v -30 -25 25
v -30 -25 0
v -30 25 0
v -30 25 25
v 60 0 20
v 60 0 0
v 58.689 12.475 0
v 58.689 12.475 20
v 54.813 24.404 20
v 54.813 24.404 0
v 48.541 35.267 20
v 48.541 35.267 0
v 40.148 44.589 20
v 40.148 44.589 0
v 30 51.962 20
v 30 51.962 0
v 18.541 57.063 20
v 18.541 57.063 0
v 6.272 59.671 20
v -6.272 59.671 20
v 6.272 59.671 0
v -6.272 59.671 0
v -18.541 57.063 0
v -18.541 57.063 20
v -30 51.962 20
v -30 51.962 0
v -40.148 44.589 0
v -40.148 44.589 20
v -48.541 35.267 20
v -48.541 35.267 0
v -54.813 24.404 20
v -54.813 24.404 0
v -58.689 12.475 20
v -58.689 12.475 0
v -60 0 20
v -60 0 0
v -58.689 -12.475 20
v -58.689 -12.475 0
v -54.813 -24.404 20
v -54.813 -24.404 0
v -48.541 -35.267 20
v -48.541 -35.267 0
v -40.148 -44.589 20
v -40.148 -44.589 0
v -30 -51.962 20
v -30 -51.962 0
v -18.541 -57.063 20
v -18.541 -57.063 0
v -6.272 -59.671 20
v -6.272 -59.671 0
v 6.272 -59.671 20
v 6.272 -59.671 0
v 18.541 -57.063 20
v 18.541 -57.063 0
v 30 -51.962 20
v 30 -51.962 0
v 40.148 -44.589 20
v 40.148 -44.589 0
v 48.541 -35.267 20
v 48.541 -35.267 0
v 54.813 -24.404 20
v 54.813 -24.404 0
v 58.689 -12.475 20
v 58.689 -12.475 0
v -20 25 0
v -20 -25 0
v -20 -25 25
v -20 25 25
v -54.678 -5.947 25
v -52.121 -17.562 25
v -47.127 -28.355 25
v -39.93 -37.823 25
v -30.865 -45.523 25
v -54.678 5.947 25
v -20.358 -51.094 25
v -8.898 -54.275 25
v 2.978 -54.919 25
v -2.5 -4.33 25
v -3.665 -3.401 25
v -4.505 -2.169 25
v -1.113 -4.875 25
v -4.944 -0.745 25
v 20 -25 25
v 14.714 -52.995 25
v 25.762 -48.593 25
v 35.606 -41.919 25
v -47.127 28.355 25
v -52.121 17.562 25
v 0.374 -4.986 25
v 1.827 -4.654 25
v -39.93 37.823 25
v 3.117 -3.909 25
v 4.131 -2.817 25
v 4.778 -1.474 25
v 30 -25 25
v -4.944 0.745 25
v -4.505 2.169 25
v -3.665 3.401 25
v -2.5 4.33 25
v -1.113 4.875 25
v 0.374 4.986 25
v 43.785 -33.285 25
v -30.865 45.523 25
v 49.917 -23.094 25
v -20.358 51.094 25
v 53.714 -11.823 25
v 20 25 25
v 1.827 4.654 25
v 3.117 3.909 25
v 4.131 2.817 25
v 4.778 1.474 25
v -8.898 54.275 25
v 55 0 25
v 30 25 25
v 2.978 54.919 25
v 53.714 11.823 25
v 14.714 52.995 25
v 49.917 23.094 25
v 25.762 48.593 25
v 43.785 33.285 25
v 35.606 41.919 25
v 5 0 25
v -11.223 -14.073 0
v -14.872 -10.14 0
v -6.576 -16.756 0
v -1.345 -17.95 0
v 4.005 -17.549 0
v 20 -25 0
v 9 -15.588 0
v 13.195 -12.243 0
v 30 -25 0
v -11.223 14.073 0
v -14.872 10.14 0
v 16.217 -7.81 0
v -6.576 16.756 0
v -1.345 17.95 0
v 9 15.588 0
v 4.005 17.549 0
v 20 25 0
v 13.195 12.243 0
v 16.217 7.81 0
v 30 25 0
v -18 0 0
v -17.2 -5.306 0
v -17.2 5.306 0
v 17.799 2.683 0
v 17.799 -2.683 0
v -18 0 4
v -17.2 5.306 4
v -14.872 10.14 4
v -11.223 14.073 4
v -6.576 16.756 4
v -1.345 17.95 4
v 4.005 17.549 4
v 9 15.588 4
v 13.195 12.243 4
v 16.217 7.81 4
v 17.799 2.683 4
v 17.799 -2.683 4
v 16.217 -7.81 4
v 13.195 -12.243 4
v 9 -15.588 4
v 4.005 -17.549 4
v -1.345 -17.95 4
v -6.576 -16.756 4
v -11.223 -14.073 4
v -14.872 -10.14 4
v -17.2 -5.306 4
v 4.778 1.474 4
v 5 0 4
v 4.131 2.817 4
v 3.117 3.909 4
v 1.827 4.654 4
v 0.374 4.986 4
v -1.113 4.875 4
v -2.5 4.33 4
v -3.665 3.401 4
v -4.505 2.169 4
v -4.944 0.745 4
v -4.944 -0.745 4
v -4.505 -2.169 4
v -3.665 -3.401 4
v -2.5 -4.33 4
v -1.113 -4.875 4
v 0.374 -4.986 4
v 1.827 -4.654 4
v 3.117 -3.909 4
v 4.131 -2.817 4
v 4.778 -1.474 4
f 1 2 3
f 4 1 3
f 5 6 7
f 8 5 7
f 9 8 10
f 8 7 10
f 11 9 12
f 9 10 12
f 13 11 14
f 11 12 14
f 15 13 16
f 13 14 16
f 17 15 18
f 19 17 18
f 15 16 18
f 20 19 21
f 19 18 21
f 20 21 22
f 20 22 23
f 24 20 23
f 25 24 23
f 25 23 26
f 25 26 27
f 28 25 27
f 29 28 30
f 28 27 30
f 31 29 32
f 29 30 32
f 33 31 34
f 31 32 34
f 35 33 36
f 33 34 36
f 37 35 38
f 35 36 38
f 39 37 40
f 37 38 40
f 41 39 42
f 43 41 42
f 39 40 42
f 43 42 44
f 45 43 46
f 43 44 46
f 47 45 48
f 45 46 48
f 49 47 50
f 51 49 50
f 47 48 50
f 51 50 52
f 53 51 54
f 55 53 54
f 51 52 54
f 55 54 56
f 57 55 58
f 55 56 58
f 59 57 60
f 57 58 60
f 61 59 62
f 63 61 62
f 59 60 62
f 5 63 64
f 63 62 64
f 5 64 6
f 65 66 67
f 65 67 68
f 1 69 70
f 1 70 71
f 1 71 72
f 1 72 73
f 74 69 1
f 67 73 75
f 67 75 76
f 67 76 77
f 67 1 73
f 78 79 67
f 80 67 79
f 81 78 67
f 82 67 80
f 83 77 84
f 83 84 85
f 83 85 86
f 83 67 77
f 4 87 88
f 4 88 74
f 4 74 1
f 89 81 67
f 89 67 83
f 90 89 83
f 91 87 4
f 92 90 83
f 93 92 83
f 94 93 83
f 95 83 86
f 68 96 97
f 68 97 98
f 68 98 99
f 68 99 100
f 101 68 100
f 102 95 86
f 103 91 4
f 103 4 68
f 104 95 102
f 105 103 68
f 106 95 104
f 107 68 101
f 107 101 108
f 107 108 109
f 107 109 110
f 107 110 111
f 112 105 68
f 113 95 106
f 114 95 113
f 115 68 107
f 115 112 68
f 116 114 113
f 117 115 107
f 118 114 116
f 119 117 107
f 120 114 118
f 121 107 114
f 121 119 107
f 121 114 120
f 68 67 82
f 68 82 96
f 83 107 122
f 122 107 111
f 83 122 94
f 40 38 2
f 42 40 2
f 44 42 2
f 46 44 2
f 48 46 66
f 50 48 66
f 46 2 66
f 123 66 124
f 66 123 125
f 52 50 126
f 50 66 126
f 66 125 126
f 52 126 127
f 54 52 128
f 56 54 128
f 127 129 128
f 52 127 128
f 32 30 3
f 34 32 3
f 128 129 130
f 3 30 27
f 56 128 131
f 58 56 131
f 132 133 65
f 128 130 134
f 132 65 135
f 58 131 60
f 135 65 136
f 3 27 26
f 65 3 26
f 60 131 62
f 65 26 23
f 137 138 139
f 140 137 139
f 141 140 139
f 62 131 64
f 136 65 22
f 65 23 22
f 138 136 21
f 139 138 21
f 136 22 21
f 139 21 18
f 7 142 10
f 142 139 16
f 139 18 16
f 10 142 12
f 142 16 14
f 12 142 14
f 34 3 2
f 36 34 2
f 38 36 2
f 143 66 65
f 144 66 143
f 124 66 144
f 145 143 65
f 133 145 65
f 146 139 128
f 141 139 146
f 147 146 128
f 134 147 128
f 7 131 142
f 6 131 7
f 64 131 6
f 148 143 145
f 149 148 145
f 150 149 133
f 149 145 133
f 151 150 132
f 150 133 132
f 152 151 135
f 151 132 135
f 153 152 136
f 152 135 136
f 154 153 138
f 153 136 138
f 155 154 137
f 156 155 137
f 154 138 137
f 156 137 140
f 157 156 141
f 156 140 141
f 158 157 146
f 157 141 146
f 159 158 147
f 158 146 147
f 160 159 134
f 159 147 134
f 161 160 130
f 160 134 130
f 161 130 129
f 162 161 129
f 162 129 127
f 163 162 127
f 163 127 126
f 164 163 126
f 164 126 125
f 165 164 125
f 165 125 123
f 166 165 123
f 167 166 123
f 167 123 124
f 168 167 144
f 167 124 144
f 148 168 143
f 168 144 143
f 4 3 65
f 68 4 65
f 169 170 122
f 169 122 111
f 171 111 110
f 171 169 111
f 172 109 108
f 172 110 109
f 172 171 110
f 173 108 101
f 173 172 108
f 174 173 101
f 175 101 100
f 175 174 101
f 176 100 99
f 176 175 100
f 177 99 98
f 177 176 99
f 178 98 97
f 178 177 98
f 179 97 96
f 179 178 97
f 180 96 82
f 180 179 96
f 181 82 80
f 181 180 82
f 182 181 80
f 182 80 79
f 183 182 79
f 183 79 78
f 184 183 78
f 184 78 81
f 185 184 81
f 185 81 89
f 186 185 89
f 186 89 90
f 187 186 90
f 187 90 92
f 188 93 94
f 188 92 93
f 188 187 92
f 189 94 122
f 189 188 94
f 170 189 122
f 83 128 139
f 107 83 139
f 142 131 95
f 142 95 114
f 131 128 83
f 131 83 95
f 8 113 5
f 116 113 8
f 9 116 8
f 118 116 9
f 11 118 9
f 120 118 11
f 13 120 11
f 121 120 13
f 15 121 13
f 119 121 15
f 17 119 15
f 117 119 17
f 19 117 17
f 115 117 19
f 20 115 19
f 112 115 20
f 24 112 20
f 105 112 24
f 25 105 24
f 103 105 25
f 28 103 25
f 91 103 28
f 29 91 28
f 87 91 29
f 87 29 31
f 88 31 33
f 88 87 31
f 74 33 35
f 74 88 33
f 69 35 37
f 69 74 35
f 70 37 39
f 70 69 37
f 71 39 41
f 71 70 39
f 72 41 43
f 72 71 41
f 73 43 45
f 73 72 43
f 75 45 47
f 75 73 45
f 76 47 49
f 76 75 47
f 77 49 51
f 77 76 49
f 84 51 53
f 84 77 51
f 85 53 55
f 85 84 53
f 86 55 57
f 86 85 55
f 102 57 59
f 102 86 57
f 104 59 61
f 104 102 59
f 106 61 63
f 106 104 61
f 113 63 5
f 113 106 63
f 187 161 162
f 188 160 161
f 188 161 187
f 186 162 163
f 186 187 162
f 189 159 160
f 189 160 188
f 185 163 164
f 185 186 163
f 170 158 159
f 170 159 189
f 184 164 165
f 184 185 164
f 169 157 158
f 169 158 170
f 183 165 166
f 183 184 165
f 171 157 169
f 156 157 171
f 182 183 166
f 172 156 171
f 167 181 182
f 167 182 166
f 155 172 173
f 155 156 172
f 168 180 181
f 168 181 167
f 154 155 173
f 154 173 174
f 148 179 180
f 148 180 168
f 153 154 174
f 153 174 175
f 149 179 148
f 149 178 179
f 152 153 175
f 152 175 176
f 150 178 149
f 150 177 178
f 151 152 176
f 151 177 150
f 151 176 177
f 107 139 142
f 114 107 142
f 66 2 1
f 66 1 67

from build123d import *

# Parameters (mm, degrees)
ESQUISSE1_R                  = 60
BOSS_EXTRU_1_DEPTH           = 25
ENL_V_MAT_EXTRU_1_DEPTH      = 89.459030065
ENL_V_MAT_EXTRU_1_DEPTH_BACK = 89.459030065
ESQUISSE2_W                  = 10
ESQUISSE2_H                  = 50
CHANFREIN1_SIZE              = 5
ENL_V_MAT_EXTRU_2_DEPTH      = 89.459030065
ENL_V_MAT_EXTRU_2_DEPTH_BACK = 89.459030065
ESQUISSE3_R                  = 5
ESQUISSE4_R                  = 18
ENL_V_MAT_EXTRU_3_DEPTH      = 4


with BuildPart() as part:
    # Esquisse1 → Boss.-Extru.1 (new body)
    with BuildSketch(Plane.XY):
        Circle(ESQUISSE1_R)
    extrude(amount=BOSS_EXTRU_1_DEPTH)

    # Esquisse2 → Enlèv. mat.-Extru.1 (cut, two sides: drawn at the far end of the back side and taken through both)
    with BuildSketch(Plane.XY.offset(25).offset(-ENL_V_MAT_EXTRU_1_DEPTH_BACK)):
        with Locations((-25, 0)):
            Rectangle(ESQUISSE2_W, ESQUISSE2_H)
        with Locations((25, 0)):
            Rectangle(ESQUISSE2_W, ESQUISSE2_H)
    extrude(amount=ENL_V_MAT_EXTRU_1_DEPTH + ENL_V_MAT_EXTRU_1_DEPTH_BACK, mode=Mode.SUBTRACT)

    # Chanfrein1
    chanfrein1_edges = [part.edges().sort_by_distance(p)[0] for p in [
        (-60, 0, 25),
    ]]
    chamfer(chanfrein1_edges, length=CHANFREIN1_SIZE)

    # Esquisse3 → Enlèv. mat.-Extru.2 (cut, two sides: drawn at the far end of the back side and taken through both)
    with BuildSketch(Plane.XY.offset(25).offset(-ENL_V_MAT_EXTRU_2_DEPTH_BACK)):
        Circle(ESQUISSE3_R)
    extrude(amount=ENL_V_MAT_EXTRU_2_DEPTH + ENL_V_MAT_EXTRU_2_DEPTH_BACK, mode=Mode.SUBTRACT)

    # Esquisse4 → Enlèv. mat.-Extru.3 (cut)
    with BuildSketch(Plane(origin=(0, 0, 0), x_dir=(-1, 0, 0), z_dir=(0, 0, -1))):
        Circle(ESQUISSE4_R)
    extrude(amount=-ENL_V_MAT_EXTRU_3_DEPTH, mode=Mode.SUBTRACT)


solid = part.part
